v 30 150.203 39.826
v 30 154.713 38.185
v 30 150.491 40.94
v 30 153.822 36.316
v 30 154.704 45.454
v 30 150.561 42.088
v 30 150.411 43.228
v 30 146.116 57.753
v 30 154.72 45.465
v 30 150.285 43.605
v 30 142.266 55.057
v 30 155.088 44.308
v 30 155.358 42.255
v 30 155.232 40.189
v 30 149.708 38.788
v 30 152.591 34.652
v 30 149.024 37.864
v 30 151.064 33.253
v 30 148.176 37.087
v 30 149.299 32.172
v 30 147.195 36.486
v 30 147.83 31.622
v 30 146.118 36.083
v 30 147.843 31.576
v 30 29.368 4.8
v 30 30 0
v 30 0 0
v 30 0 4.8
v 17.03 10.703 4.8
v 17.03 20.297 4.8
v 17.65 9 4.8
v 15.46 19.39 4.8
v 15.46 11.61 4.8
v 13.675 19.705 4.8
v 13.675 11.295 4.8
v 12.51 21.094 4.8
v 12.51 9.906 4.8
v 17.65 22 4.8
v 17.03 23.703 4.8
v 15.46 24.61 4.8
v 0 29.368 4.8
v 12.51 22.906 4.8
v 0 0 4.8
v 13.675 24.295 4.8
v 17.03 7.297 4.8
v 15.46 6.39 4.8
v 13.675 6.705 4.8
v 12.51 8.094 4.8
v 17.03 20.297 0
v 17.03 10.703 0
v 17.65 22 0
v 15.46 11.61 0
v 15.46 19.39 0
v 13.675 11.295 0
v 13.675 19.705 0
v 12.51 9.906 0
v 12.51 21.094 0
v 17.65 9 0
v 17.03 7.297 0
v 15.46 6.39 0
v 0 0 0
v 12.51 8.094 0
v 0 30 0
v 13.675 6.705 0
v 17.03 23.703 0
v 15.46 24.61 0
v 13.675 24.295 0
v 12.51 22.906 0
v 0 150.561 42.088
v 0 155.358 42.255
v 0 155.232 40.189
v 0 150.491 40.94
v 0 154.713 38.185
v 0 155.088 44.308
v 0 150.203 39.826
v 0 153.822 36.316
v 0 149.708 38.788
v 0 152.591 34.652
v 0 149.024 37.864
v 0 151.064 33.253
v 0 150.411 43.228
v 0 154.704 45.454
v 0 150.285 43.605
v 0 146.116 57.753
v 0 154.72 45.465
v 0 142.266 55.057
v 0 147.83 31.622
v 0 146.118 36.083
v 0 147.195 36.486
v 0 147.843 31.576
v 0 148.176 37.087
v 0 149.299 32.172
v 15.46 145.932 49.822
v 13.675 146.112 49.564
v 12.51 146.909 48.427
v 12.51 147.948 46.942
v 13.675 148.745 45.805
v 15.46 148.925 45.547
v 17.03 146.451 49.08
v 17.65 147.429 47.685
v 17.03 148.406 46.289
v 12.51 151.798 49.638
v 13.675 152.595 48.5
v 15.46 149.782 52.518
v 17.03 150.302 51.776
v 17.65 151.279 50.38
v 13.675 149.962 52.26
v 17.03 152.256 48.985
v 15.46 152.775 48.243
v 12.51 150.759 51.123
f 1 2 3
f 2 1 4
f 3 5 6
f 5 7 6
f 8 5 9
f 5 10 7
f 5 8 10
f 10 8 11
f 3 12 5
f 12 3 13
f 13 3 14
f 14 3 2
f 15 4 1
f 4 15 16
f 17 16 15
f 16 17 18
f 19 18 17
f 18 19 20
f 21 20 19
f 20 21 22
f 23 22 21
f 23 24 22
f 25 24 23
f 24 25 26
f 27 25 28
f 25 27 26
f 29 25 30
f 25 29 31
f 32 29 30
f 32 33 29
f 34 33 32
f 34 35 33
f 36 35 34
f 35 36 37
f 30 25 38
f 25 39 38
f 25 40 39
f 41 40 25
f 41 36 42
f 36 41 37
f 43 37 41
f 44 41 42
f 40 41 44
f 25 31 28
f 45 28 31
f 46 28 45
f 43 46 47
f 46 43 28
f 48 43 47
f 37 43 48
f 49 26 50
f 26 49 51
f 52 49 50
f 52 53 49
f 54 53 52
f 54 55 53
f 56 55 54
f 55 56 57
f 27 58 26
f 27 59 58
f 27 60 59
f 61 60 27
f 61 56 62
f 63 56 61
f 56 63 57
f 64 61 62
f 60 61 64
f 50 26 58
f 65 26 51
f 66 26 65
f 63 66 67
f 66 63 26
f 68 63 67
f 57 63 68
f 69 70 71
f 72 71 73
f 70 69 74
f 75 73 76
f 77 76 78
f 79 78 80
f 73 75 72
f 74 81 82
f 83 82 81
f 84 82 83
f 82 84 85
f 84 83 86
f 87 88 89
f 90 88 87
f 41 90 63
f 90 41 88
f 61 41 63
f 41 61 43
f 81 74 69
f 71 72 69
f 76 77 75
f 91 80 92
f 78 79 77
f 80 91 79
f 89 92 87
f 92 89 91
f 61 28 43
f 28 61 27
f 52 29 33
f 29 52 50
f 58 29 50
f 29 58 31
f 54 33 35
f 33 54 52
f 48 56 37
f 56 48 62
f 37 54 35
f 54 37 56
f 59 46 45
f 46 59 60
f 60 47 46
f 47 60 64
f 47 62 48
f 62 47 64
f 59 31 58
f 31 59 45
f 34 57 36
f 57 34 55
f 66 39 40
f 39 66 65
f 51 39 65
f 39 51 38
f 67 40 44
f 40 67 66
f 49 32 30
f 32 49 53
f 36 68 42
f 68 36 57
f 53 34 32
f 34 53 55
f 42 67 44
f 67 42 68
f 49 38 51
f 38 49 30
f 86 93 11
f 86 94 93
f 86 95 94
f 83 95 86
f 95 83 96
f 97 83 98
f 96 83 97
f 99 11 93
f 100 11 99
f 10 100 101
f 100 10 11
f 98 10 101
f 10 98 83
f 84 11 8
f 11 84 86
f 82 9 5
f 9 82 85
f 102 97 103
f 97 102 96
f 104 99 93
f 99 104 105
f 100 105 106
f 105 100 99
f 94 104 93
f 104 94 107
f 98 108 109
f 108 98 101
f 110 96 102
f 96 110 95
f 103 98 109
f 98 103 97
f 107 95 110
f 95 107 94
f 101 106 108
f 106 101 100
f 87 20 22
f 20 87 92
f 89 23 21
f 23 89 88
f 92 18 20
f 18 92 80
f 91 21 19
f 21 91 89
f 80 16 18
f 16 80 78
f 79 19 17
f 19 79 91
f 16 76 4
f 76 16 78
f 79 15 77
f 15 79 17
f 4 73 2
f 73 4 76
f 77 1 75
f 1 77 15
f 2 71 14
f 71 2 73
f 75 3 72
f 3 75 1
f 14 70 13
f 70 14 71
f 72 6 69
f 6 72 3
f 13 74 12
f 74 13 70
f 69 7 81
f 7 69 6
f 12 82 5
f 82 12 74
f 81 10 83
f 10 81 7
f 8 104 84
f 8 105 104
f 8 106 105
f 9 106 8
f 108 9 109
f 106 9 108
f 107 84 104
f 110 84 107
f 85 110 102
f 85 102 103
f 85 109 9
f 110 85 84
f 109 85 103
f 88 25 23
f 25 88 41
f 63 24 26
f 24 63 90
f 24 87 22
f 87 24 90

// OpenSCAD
/*
 * Bike rack adapter for Merin Ignacio & Axiom Slim rack.
 * This should work for in place of any aluminium short rack adapter.
 * 
 * Project URL
 * https://github.com/avolkov/openscad-designs/tomato-can-saucer
 *
 * Copyright 2021 Alex Volkov <alex@flamy.ca>
 * License: Attribution-ShareAlike 4.0 International (CC BY-SA)
 * https://creativecommons.org/licenses/by-sa/4.0/
 *
 * Version 1.1 2021-05-24 Replaced cylinder joints with rotate_extrude
 * Version 1.0 2018-06-10 Initial Design
 */

$fa=0.8;

width=30;
thick=4.8;
m5_d=5.3;
//Segment lengths
first_seg_l= 30;
second_seg_l=135;
fourth_seg_l=25;

rail_hole_offset = 8;

frame_hook_deg = 110;

module rack_mount(){
    difference(){
        cube([width, first_seg_l, thick]);
        translate([width/2, first_seg_l - rail_hole_offset - 13, 0])
            cylinder(h=thick +2, d=m5_d);
        translate([width/2, first_seg_l - rail_hole_offset, 0])
            cylinder(h=thick + 2, d=m5_d);
    }
}


module 15_deg_bend(){
    rotate([15, 0, 0]){
        cube([width, second_seg_l -13, thick]);
    }
}

module u_bend(){
    translate([0,-13.5,8.8])
        rotate([0, 90, 0])
            rotate_extrude(angle=frame_hook_deg)
                translate([6,0,0])
                    square([thick, width]);

    rotate([frame_hook_deg, 0, 0]){
        translate([0, 10, -0.8]){
            difference(){
                cube([width, 15, thick]);
                translate([width/2, 6, 0]) cylinder(h=thick+3, d=m5_d);
            }
        }
    }
}

union(){
    rack_mount();
    translate([0, first_seg_l, 0,]){
        15_deg_bend();
        rotate([15, 0, 0]) //add initial bend to position u-bend
            translate([0, second_seg_l, 2]){
                difference(){
                    u_bend();
                    rotate([frame_hook_deg, 0, 0])
                        translate([0, 8, -thick -0.7])
                            cube([width, 18, thick]);
                }
            }
    }
}
